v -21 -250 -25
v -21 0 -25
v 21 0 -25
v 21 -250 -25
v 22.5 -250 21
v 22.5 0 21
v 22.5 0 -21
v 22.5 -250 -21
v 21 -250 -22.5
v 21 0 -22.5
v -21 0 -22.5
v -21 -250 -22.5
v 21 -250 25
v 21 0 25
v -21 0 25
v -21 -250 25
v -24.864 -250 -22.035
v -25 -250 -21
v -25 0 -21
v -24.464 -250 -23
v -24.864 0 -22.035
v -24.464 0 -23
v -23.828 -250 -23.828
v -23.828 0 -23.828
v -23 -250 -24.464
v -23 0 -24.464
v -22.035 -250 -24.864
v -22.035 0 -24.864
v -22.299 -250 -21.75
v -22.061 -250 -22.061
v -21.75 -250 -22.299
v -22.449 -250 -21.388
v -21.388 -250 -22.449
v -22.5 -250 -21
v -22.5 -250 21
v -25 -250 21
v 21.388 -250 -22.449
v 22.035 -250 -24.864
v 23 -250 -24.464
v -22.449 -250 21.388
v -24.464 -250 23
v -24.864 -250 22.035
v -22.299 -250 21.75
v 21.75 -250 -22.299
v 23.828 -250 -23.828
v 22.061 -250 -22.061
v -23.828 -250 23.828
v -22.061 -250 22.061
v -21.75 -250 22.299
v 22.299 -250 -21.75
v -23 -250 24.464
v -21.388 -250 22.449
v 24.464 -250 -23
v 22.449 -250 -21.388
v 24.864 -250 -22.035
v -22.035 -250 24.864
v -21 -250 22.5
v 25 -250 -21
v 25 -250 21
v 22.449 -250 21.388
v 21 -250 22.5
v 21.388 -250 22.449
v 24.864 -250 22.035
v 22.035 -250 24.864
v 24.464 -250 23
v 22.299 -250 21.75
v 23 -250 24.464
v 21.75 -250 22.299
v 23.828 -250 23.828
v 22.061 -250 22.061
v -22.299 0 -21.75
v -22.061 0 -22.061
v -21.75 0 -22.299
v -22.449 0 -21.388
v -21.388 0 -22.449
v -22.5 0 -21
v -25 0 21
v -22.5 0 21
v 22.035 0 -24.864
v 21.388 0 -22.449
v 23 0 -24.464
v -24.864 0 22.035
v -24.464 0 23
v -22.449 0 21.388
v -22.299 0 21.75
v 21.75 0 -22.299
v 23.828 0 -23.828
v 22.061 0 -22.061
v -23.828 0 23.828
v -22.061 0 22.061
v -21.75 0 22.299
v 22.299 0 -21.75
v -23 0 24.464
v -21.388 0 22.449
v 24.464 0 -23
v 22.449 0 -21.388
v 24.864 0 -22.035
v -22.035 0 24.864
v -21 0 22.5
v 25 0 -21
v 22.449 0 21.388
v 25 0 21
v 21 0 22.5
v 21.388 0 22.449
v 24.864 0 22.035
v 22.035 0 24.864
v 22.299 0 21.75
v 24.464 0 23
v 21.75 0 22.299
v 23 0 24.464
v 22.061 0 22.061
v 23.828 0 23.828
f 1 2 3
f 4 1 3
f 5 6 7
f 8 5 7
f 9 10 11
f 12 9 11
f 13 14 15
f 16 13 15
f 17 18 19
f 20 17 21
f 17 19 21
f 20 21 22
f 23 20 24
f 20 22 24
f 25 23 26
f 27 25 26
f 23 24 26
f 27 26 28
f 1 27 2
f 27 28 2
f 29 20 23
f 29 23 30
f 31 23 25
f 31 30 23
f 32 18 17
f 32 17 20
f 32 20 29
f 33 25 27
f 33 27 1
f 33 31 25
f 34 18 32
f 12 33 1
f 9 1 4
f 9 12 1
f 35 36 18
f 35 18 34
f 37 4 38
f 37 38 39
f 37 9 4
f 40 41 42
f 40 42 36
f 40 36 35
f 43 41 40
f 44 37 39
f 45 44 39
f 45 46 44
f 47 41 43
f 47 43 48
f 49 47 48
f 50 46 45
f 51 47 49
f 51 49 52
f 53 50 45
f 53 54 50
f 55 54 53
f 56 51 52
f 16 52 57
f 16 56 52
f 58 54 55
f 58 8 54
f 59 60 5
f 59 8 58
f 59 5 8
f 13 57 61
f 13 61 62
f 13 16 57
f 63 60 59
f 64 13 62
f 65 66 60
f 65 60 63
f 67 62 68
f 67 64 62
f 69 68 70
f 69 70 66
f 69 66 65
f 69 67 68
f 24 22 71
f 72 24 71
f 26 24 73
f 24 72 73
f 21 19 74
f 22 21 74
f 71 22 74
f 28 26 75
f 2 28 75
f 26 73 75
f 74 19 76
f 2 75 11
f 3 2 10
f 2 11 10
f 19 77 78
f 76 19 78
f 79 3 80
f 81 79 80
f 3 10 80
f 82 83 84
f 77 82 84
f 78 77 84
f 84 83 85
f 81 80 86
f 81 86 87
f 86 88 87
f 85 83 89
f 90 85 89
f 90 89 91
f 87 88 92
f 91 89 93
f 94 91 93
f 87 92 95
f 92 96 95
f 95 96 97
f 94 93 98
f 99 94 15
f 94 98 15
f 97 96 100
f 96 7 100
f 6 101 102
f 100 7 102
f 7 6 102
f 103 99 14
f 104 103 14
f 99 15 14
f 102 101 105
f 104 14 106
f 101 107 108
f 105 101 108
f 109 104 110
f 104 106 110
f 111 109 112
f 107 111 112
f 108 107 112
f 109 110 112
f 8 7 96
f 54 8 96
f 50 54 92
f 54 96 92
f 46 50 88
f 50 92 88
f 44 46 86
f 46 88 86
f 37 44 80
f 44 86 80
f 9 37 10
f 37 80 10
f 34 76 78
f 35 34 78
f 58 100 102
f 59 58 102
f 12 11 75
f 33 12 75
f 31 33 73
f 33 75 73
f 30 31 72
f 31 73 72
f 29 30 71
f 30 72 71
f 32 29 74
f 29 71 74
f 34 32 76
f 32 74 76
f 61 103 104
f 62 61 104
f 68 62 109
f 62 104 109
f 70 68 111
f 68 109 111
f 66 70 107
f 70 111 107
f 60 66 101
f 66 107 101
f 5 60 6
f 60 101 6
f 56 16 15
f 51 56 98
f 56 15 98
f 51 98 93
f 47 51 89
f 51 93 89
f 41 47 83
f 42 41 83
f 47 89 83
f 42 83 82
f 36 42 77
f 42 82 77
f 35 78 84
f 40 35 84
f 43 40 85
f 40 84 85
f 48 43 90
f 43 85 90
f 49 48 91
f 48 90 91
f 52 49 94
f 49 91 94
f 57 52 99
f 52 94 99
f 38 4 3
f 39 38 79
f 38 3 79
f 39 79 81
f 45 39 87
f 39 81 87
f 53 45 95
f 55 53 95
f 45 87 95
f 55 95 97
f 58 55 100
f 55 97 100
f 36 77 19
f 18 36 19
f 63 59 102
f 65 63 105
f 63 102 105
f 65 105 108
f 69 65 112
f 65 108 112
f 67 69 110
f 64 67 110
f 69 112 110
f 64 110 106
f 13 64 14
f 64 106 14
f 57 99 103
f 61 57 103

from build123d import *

# Parameters (mm, degrees)
F1_DEPTH = 250


# Not quite as in the source:
# - a feature names something its author has since deleted; it is built from what else it names


with BuildPart() as f1:
    # F0 (on Front) → F1 (new body)
    with BuildSketch(Plane.XZ):
        with BuildLine():
            Line((21, 25), (-21, 25))
            ThreePointArc((-21, 25), (-23.8284271247, 23.8284271247), (-25, 21))
            Line((-25, 21), (-25, -21))
            ThreePointArc((-25, -21), (-23.8284271247, -23.8284271247), (-21, -25))
            Line((-21, -25), (21, -25))
            ThreePointArc((21, -25), (23.8284271247, -23.8284271247), (25, -21))
            Line((25, -21), (25, 21))
            ThreePointArc((25, 21), (23.8284271247, 23.8284271247), (21, 25))
        make_face()
        with BuildLine():
            ThreePointArc((-22.5, 21), (-22.0606601718, 22.0606601718), (-21, 22.5))
            Line((-21, 22.5), (21, 22.5))
            ThreePointArc((21, 22.5), (22.0606601718, 22.0606601718), (22.5, 21))
            Line((22.5, 21), (22.5, -21))
            ThreePointArc((22.5, -21), (22.0606601718, -22.0606601718), (21, -22.5))
            Line((21, -22.5), (-21, -22.5))
            ThreePointArc((-21, -22.5), (-22.0606601718, -22.0606601718), (-22.5, -21))
            Line((-22.5, -21), (-22.5, 21))
        make_face(mode=Mode.SUBTRACT)
    extrude(amount=F1_DEPTH)


solid = f1.part
